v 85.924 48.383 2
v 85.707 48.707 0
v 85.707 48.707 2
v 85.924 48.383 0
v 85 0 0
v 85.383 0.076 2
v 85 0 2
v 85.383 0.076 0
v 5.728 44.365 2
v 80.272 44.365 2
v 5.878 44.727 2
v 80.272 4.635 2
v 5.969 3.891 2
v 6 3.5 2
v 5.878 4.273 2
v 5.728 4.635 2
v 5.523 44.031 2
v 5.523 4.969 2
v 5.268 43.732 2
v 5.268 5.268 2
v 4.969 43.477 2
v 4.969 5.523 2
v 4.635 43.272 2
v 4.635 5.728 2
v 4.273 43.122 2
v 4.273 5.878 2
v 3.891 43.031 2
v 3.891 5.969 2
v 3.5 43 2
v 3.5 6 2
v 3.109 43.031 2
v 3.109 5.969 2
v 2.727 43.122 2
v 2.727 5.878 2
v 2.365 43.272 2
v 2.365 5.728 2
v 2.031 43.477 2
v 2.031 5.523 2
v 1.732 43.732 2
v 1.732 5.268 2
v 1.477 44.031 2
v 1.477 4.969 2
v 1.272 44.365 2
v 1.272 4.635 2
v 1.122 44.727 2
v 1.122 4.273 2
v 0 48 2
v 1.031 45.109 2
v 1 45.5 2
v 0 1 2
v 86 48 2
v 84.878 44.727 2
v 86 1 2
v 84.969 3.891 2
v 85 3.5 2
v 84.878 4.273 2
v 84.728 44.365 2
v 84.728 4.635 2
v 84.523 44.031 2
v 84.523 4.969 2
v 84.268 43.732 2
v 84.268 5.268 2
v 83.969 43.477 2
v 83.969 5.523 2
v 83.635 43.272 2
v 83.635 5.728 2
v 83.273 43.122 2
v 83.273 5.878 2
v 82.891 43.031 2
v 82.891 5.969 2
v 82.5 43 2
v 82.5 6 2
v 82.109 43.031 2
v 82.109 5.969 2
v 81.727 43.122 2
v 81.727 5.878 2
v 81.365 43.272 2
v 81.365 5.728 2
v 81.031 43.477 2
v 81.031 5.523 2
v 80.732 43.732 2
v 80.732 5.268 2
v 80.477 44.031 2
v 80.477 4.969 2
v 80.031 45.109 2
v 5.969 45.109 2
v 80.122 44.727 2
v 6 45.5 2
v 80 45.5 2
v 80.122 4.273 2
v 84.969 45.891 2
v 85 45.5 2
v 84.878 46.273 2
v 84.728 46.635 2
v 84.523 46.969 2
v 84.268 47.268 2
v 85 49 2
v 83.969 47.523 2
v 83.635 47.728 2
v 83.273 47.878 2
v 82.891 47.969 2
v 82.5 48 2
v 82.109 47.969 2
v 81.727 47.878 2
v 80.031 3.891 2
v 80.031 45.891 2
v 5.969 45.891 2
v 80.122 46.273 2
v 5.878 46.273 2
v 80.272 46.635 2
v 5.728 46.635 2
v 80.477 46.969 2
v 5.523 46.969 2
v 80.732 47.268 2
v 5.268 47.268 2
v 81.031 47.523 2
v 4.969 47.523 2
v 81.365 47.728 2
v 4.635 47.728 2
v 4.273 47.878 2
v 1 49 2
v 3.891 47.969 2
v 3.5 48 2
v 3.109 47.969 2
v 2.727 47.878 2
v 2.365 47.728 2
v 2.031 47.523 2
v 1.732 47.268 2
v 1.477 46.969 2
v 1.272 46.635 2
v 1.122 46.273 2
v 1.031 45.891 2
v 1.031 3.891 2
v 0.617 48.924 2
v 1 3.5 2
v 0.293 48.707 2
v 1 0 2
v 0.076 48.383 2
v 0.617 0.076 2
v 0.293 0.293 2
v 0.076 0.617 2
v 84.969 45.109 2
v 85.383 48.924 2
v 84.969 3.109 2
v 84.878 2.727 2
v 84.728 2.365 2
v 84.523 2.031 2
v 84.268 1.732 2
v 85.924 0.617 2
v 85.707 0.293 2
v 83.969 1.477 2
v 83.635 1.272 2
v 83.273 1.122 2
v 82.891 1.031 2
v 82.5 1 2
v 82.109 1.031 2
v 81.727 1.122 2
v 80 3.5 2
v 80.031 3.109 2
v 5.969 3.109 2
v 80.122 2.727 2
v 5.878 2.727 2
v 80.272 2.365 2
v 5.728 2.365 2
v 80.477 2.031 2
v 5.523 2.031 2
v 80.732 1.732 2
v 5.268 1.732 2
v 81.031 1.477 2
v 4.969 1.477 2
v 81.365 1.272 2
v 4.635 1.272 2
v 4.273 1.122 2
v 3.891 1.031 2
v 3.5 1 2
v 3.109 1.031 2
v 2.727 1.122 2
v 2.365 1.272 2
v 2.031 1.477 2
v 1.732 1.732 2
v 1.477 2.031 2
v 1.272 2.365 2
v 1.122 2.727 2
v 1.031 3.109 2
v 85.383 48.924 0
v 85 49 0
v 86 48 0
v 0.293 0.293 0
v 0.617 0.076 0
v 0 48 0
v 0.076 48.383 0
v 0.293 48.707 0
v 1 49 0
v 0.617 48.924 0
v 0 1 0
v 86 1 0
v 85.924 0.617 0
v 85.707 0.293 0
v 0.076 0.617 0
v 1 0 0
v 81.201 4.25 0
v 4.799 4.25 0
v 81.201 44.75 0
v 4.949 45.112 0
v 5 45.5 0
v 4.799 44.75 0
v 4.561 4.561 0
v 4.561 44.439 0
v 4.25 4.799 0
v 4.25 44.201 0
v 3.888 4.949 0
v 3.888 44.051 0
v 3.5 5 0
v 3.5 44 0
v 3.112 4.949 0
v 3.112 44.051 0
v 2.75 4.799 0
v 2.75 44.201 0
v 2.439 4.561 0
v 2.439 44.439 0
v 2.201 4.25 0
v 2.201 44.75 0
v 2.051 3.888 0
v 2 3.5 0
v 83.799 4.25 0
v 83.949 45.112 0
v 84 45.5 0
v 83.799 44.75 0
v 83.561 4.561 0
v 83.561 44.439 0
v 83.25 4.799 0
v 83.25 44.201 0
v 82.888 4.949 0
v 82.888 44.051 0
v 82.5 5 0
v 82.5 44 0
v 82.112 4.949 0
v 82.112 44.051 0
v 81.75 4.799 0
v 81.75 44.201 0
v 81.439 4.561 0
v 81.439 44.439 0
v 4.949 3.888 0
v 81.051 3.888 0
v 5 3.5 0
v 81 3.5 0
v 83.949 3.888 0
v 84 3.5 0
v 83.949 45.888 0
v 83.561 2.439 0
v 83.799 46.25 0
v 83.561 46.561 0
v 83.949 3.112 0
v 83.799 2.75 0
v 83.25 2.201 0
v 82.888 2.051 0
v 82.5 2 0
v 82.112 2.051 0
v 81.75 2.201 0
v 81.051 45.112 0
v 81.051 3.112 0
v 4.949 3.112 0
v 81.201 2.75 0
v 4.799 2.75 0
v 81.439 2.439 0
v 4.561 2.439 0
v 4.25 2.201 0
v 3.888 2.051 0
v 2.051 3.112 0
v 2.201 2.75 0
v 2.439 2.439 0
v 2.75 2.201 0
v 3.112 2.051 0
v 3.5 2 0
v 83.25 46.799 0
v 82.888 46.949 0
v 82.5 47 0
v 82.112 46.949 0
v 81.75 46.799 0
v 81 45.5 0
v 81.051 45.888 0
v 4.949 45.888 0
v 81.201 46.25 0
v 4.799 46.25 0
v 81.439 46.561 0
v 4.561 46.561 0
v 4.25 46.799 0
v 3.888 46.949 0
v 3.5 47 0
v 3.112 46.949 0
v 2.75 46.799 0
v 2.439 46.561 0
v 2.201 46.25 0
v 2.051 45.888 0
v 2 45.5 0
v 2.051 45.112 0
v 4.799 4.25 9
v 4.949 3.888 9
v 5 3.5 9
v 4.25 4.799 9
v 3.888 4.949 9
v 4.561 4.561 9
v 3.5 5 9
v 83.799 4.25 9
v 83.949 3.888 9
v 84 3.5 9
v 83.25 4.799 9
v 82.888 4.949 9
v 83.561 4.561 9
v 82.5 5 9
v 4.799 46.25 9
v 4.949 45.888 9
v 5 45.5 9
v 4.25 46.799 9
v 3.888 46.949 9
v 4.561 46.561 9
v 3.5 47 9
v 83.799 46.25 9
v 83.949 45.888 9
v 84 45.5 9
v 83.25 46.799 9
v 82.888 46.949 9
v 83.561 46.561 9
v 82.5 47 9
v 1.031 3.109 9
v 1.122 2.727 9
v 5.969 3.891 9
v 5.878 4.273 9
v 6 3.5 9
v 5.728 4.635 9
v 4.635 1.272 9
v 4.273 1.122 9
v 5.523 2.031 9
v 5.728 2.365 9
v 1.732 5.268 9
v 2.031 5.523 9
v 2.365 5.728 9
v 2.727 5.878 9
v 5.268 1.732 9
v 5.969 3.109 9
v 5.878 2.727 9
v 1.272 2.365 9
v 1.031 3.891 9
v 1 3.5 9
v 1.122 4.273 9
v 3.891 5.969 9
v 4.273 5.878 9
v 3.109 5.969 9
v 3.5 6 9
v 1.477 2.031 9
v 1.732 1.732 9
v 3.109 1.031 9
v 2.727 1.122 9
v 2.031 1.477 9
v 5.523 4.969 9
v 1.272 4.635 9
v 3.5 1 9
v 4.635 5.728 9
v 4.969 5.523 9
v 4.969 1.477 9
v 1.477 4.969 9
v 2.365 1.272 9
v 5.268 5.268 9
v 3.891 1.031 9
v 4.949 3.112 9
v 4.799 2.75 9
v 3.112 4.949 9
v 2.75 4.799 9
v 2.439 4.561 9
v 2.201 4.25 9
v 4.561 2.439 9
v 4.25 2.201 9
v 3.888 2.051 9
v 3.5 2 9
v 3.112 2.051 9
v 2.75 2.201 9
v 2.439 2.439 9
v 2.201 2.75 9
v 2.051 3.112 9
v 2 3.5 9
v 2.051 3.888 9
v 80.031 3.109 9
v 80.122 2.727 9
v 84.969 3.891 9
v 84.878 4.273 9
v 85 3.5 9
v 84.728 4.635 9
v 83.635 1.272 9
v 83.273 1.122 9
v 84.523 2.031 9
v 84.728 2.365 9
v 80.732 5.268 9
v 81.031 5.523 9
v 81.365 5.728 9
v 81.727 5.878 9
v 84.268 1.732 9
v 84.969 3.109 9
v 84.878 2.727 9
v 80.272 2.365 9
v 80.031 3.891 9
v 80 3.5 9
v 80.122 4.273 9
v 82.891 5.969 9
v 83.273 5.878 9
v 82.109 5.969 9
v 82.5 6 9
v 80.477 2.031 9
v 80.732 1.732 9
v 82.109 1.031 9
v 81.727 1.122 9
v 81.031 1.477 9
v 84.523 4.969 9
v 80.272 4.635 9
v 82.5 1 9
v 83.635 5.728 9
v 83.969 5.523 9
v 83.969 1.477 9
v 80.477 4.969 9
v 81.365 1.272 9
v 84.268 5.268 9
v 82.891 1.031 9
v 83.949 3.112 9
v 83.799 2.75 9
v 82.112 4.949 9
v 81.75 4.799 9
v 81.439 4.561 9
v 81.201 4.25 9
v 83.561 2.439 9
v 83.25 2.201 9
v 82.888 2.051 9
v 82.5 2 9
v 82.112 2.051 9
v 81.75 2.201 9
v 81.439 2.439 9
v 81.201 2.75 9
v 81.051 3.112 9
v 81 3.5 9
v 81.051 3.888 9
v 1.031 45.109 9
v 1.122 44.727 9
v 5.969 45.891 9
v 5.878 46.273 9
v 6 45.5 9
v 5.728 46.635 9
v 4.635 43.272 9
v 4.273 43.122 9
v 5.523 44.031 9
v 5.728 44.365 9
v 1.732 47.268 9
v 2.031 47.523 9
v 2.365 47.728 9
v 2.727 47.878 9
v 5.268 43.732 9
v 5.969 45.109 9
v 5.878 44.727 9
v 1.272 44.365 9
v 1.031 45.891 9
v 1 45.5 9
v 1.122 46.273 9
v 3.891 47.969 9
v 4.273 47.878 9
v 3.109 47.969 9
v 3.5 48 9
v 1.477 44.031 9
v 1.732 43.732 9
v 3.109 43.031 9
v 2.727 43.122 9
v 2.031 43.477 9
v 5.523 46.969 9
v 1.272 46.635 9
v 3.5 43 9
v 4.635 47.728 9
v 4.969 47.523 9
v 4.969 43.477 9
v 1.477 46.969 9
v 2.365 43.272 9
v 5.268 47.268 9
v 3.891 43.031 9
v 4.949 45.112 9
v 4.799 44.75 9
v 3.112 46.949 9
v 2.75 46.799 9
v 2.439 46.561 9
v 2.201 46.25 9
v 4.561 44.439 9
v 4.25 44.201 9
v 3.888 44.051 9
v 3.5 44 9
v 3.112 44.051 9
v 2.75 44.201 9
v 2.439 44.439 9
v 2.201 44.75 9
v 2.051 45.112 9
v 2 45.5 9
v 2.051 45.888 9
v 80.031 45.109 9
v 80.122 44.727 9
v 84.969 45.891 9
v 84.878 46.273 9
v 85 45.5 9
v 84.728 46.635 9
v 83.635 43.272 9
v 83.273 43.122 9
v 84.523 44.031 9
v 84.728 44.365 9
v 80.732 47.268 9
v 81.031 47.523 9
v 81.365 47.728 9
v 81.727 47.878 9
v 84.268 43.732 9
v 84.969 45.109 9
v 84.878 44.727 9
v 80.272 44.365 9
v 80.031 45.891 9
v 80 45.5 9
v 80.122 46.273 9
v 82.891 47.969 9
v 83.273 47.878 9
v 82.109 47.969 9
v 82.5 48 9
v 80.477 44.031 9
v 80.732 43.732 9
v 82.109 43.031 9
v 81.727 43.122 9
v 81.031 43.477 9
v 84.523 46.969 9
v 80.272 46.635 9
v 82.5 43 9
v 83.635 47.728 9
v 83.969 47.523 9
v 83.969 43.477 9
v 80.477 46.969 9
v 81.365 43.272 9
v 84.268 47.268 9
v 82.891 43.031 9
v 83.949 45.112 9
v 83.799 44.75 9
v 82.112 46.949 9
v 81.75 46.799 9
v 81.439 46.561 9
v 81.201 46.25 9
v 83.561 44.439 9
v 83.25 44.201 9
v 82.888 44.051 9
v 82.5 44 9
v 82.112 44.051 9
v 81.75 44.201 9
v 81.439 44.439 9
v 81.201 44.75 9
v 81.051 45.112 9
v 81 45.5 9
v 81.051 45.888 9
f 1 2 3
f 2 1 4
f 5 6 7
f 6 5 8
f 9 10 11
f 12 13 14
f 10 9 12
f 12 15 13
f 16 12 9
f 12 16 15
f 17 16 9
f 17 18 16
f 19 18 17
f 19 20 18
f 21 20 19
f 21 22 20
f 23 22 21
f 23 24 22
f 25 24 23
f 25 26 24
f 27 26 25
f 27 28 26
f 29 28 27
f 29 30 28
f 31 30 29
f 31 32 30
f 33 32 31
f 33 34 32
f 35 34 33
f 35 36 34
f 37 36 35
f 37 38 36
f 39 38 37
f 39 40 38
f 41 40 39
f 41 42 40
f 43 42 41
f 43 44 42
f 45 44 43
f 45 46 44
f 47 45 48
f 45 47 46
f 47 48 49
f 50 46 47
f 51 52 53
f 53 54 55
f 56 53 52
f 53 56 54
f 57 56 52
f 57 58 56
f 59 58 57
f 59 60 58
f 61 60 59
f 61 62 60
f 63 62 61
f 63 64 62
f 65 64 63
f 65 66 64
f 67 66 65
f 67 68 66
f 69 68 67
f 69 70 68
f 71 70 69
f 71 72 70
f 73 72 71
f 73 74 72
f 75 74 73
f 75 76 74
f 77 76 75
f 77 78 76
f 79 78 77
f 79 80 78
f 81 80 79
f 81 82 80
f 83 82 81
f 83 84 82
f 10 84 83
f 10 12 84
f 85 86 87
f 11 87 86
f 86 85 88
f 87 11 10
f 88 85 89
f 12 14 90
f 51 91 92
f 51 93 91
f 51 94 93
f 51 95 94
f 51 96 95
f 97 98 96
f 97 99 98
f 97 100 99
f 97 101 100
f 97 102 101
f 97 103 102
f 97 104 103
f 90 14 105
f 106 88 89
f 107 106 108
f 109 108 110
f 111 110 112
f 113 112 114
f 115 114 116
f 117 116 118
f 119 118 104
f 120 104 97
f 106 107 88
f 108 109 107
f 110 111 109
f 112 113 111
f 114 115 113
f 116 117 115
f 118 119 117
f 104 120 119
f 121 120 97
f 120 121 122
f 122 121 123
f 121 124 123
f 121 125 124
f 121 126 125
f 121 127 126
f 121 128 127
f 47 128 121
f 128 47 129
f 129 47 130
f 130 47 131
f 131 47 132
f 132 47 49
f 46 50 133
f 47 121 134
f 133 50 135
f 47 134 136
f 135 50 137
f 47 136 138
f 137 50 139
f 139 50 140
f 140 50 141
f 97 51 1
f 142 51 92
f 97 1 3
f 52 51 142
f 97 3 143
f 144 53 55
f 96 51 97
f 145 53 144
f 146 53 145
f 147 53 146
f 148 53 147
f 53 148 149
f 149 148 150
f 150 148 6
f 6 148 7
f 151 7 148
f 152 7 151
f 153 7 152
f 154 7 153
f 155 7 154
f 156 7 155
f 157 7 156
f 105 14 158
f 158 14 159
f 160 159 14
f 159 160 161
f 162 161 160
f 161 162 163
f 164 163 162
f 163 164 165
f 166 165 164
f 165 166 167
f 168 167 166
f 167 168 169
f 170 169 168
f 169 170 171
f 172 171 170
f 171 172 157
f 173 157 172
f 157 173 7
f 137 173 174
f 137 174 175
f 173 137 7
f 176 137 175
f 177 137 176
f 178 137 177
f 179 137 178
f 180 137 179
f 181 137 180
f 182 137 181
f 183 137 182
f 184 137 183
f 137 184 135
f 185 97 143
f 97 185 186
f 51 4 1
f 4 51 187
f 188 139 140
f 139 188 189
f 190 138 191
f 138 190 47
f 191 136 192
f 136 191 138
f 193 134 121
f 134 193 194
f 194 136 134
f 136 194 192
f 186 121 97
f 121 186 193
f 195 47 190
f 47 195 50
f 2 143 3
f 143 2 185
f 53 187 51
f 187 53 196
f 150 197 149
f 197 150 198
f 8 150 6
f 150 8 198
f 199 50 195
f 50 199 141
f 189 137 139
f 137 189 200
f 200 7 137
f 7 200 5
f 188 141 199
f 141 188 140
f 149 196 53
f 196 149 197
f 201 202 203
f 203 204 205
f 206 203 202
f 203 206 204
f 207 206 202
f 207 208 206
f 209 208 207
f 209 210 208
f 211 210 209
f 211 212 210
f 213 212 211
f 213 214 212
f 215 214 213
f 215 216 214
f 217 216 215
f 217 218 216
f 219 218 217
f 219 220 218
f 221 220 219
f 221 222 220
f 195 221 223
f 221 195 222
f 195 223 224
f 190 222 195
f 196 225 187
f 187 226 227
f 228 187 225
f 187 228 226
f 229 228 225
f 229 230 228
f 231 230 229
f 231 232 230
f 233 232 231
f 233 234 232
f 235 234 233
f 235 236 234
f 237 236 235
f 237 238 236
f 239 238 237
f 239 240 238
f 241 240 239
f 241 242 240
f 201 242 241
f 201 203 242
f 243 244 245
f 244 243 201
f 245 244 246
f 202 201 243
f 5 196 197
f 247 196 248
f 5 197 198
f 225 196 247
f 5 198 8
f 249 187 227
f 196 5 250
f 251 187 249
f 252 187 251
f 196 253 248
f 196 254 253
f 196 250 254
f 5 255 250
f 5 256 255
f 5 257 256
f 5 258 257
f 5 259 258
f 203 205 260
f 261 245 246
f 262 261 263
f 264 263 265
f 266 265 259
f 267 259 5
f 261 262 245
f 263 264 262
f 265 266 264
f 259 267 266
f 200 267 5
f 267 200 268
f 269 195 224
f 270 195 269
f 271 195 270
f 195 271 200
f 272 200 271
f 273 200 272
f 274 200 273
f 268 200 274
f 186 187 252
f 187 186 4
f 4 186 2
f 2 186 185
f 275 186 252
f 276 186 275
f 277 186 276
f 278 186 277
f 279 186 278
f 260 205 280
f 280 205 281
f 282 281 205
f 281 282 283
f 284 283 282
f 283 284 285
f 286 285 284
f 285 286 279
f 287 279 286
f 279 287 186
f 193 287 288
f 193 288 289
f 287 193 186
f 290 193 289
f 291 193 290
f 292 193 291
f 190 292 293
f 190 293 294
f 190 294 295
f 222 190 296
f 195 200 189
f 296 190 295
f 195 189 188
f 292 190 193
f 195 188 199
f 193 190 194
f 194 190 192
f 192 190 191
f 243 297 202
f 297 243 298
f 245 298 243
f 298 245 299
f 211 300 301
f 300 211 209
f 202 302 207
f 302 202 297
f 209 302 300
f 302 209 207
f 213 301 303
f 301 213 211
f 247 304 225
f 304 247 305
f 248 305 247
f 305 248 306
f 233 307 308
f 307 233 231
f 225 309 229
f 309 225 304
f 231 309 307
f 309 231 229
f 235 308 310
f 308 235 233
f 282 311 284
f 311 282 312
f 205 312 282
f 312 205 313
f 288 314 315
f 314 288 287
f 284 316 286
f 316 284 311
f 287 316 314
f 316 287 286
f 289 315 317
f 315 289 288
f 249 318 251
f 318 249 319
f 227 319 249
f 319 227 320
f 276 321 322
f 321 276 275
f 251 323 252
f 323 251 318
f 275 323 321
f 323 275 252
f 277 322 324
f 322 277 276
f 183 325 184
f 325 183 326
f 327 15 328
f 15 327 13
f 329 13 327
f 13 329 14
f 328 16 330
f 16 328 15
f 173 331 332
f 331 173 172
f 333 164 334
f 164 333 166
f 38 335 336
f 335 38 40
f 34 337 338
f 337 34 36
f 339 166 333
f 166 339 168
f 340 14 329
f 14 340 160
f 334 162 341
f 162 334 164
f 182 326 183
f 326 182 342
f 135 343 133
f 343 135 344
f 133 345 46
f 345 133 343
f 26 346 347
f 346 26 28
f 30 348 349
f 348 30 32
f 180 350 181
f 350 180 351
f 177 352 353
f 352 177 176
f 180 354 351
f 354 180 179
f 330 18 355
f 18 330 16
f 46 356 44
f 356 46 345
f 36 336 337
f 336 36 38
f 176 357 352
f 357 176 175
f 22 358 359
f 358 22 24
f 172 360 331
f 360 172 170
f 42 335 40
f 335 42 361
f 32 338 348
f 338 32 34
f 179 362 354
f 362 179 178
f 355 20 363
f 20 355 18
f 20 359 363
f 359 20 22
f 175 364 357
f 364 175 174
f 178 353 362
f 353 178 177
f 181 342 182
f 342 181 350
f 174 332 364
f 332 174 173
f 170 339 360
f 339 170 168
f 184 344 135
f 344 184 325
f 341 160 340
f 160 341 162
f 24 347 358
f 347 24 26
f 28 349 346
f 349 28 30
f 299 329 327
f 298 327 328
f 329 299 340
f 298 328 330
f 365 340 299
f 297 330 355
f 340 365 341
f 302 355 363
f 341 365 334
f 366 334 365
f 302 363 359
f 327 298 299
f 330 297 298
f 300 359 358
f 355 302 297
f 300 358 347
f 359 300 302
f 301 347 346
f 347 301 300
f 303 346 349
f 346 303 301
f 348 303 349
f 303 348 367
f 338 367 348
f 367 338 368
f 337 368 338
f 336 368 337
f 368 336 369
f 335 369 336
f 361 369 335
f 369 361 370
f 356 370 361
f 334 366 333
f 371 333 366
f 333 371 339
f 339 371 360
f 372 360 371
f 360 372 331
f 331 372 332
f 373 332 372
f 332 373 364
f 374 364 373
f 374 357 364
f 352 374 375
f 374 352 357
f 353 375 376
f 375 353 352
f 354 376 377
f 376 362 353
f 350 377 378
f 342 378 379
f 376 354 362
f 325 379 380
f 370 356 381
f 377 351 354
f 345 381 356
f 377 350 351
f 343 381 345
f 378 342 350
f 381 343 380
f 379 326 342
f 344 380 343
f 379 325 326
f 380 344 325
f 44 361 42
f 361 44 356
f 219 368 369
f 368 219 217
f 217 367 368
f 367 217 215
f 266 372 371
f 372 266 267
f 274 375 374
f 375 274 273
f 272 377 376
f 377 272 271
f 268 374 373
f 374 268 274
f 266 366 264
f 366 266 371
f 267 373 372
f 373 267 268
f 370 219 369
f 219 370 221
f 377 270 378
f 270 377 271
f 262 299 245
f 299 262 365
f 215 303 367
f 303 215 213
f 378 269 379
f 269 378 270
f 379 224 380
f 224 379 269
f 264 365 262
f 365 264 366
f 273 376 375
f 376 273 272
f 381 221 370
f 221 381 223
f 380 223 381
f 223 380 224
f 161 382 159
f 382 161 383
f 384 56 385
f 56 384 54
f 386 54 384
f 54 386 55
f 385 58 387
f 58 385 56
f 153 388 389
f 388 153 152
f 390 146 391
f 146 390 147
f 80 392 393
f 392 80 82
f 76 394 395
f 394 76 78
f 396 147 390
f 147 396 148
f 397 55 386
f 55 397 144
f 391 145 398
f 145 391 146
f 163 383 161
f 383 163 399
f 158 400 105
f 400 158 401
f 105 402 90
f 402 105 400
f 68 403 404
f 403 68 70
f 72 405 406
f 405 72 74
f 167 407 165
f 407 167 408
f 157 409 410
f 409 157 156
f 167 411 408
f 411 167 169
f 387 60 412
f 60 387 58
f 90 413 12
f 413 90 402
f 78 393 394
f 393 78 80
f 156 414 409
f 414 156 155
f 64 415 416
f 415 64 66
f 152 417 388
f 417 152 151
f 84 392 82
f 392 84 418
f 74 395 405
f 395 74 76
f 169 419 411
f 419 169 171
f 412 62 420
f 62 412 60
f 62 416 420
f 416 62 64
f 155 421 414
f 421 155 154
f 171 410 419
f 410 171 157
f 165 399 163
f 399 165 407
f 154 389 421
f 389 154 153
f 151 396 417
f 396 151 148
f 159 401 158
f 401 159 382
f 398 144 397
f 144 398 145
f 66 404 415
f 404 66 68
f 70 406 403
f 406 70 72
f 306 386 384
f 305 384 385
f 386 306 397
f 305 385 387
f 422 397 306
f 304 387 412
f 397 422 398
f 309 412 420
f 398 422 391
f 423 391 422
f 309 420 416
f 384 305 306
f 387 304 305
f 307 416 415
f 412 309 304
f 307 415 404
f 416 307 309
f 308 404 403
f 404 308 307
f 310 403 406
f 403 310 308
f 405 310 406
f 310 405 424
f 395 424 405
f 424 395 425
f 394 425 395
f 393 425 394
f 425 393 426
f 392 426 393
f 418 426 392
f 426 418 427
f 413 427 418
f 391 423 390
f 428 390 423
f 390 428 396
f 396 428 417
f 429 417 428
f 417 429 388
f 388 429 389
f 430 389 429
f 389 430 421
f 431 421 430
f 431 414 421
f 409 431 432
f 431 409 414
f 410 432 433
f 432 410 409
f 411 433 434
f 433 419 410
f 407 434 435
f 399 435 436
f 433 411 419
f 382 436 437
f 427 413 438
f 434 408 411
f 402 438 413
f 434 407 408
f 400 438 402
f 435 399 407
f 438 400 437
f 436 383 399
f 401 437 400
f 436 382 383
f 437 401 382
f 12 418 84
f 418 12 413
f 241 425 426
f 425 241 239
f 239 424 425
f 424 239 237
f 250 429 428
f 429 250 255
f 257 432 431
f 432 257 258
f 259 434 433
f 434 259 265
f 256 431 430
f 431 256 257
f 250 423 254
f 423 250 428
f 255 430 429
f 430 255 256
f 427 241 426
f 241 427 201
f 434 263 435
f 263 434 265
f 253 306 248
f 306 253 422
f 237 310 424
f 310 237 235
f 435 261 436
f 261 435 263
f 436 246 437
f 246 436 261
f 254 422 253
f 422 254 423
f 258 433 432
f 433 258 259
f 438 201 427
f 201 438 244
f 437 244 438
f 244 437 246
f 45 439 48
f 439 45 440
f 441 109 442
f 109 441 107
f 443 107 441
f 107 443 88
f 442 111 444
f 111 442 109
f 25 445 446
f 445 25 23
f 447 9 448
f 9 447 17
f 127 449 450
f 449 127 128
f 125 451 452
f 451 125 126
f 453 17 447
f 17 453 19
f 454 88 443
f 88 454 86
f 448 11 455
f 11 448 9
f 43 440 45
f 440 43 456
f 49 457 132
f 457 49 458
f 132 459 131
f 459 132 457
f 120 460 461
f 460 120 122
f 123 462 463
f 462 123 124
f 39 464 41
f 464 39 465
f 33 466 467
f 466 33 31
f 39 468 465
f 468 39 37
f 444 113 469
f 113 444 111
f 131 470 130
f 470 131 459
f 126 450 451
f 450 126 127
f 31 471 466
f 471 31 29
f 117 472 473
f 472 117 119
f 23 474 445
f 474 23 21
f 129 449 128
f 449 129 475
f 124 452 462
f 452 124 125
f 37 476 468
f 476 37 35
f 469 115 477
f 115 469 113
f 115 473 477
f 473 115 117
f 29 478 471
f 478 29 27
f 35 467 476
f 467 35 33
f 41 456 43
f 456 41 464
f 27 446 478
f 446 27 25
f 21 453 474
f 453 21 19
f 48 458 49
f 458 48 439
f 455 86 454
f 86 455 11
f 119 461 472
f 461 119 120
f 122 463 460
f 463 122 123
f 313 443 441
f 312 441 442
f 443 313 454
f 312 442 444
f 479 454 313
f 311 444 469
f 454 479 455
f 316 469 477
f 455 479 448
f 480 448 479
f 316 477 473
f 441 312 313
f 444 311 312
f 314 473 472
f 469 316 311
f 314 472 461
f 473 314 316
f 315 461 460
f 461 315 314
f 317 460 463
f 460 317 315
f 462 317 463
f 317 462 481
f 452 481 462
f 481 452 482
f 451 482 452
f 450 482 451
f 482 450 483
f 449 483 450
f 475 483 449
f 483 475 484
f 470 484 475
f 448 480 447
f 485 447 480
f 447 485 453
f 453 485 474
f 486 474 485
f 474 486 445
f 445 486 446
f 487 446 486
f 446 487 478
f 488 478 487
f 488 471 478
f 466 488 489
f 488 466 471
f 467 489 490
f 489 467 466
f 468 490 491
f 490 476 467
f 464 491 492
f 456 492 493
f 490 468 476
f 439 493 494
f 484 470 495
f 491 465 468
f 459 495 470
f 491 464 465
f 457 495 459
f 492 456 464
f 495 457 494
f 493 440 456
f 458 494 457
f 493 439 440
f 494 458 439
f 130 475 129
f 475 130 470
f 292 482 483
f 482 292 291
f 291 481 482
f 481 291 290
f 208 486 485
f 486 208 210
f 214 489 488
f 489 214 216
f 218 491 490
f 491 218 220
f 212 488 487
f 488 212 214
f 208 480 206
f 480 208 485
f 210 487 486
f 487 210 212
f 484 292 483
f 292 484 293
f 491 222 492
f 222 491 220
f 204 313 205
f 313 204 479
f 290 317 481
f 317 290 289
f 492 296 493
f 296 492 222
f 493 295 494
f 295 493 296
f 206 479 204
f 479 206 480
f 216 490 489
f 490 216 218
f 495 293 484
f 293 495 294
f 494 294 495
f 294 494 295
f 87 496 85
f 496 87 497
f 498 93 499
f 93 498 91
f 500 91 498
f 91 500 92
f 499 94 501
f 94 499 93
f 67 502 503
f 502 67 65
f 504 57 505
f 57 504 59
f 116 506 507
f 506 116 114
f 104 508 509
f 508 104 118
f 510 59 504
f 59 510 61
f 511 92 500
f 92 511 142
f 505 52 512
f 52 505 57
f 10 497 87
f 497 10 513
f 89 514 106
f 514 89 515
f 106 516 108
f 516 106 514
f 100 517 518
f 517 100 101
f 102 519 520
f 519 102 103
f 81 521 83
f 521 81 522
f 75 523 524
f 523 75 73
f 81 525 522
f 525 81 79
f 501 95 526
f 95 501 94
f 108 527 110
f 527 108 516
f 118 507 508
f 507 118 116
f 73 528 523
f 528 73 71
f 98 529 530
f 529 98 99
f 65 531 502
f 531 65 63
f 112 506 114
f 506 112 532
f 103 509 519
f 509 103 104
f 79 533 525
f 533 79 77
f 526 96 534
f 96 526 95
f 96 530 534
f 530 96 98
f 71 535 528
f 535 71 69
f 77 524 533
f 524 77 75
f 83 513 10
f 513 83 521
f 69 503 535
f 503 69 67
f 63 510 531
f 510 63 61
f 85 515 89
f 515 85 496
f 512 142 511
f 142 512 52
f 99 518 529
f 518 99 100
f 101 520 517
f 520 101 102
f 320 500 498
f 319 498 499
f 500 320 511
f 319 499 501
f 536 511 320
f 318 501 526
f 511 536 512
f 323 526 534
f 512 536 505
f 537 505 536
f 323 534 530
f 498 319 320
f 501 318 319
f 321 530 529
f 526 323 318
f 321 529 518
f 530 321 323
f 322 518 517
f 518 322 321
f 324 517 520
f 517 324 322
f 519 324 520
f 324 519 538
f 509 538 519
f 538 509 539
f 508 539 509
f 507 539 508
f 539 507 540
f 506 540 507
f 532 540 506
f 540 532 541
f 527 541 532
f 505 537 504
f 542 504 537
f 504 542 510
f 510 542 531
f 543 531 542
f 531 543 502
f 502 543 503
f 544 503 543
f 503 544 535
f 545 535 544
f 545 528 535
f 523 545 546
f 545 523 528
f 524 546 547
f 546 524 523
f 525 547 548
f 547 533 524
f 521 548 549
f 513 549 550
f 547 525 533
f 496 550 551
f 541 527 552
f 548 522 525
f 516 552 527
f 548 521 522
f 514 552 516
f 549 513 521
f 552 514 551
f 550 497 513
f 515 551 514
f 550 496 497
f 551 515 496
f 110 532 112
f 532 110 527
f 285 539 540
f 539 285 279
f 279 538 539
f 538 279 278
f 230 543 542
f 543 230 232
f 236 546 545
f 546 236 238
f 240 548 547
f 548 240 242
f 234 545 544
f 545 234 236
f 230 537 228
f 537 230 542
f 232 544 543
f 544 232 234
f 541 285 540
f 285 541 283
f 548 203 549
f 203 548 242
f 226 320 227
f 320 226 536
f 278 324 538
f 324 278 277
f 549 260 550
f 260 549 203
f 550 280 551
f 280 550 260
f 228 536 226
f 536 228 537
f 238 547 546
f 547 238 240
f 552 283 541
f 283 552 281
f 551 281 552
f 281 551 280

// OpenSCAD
// Render Control
$fa = 1;
$fs = 0.4;

// Dimensions: Badger
widthBadger = 86;
heightBadger = 49;

// Dimensions: Fixings
radiusHole = 3 / 2;
lengthThread = 7;
offsetHole = 2;
radiusStrut = 5 / 2;

// Dimensions: General
depthPlate = 2;
radiusPlate = 1;

// Model: Badge Plate
render() {
    difference() {
        // Plate Body
        hull() {
            translate([radiusPlate, radiusPlate, 0])
                cylinder(r=radiusPlate, h=depthPlate);

            translate([widthBadger - radiusPlate, radiusPlate, 0])
                cylinder(r=radiusPlate, h=depthPlate);

            translate([radiusPlate, heightBadger - radiusPlate, 0])
                cylinder(r=radiusPlate, h=depthPlate);

            translate([widthBadger - radiusPlate, heightBadger - radiusPlate, 0])
                cylinder(r=radiusPlate, h=depthPlate);
        }
        
        // Subtract Holes for the screw threads
        translate([offsetHole + radiusHole, offsetHole + radiusHole, 0])
            cylinder(r=radiusHole, h=depthPlate);

        translate([widthBadger - (offsetHole + radiusHole), offsetHole + radiusHole, 0])
            cylinder(r=radiusHole, h=depthPlate);

        translate([offsetHole + radiusHole, heightBadger - (offsetHole + radiusHole), 0])
            cylinder(r=radiusHole, h=depthPlate);

        translate([widthBadger - (offsetHole + radiusHole), heightBadger - (offsetHole + radiusHole), 0])
            cylinder(r=radiusHole, h=depthPlate);

    }

    // Screw Struts
    translate([offsetHole + radiusHole, offsetHole + radiusHole, 0])
        difference() {
            // Support Body
            cylinder(r=radiusStrut, h=lengthThread + depthPlate);

            // Thread hole
            cylinder(r=radiusHole, h=lengthThread + depthPlate);
        }

    translate([widthBadger - (offsetHole + radiusHole), offsetHole + radiusHole, 0])
        difference() {
            // Support Body
            cylinder(r=radiusStrut, h=lengthThread + depthPlate);

            // Thread hole
            cylinder(r=radiusHole, h=lengthThread + depthPlate);
        }

    translate([offsetHole + radiusHole, heightBadger - (offsetHole + radiusHole), 0])
        difference() {
            // Support Body
            cylinder(r=radiusStrut, h=lengthThread + depthPlate);

            // Thread hole
            cylinder(r=radiusHole, h=lengthThread + depthPlate);
        }

    translate([widthBadger - (offsetHole + radiusHole), heightBadger - (offsetHole + radiusHole), 0])
        difference() {
            // Support Body
            cylinder(r=radiusStrut, h=lengthThread + depthPlate);

            // Thread hole
            cylinder(r=radiusHole, h=lengthThread + depthPlate);
        }
}
